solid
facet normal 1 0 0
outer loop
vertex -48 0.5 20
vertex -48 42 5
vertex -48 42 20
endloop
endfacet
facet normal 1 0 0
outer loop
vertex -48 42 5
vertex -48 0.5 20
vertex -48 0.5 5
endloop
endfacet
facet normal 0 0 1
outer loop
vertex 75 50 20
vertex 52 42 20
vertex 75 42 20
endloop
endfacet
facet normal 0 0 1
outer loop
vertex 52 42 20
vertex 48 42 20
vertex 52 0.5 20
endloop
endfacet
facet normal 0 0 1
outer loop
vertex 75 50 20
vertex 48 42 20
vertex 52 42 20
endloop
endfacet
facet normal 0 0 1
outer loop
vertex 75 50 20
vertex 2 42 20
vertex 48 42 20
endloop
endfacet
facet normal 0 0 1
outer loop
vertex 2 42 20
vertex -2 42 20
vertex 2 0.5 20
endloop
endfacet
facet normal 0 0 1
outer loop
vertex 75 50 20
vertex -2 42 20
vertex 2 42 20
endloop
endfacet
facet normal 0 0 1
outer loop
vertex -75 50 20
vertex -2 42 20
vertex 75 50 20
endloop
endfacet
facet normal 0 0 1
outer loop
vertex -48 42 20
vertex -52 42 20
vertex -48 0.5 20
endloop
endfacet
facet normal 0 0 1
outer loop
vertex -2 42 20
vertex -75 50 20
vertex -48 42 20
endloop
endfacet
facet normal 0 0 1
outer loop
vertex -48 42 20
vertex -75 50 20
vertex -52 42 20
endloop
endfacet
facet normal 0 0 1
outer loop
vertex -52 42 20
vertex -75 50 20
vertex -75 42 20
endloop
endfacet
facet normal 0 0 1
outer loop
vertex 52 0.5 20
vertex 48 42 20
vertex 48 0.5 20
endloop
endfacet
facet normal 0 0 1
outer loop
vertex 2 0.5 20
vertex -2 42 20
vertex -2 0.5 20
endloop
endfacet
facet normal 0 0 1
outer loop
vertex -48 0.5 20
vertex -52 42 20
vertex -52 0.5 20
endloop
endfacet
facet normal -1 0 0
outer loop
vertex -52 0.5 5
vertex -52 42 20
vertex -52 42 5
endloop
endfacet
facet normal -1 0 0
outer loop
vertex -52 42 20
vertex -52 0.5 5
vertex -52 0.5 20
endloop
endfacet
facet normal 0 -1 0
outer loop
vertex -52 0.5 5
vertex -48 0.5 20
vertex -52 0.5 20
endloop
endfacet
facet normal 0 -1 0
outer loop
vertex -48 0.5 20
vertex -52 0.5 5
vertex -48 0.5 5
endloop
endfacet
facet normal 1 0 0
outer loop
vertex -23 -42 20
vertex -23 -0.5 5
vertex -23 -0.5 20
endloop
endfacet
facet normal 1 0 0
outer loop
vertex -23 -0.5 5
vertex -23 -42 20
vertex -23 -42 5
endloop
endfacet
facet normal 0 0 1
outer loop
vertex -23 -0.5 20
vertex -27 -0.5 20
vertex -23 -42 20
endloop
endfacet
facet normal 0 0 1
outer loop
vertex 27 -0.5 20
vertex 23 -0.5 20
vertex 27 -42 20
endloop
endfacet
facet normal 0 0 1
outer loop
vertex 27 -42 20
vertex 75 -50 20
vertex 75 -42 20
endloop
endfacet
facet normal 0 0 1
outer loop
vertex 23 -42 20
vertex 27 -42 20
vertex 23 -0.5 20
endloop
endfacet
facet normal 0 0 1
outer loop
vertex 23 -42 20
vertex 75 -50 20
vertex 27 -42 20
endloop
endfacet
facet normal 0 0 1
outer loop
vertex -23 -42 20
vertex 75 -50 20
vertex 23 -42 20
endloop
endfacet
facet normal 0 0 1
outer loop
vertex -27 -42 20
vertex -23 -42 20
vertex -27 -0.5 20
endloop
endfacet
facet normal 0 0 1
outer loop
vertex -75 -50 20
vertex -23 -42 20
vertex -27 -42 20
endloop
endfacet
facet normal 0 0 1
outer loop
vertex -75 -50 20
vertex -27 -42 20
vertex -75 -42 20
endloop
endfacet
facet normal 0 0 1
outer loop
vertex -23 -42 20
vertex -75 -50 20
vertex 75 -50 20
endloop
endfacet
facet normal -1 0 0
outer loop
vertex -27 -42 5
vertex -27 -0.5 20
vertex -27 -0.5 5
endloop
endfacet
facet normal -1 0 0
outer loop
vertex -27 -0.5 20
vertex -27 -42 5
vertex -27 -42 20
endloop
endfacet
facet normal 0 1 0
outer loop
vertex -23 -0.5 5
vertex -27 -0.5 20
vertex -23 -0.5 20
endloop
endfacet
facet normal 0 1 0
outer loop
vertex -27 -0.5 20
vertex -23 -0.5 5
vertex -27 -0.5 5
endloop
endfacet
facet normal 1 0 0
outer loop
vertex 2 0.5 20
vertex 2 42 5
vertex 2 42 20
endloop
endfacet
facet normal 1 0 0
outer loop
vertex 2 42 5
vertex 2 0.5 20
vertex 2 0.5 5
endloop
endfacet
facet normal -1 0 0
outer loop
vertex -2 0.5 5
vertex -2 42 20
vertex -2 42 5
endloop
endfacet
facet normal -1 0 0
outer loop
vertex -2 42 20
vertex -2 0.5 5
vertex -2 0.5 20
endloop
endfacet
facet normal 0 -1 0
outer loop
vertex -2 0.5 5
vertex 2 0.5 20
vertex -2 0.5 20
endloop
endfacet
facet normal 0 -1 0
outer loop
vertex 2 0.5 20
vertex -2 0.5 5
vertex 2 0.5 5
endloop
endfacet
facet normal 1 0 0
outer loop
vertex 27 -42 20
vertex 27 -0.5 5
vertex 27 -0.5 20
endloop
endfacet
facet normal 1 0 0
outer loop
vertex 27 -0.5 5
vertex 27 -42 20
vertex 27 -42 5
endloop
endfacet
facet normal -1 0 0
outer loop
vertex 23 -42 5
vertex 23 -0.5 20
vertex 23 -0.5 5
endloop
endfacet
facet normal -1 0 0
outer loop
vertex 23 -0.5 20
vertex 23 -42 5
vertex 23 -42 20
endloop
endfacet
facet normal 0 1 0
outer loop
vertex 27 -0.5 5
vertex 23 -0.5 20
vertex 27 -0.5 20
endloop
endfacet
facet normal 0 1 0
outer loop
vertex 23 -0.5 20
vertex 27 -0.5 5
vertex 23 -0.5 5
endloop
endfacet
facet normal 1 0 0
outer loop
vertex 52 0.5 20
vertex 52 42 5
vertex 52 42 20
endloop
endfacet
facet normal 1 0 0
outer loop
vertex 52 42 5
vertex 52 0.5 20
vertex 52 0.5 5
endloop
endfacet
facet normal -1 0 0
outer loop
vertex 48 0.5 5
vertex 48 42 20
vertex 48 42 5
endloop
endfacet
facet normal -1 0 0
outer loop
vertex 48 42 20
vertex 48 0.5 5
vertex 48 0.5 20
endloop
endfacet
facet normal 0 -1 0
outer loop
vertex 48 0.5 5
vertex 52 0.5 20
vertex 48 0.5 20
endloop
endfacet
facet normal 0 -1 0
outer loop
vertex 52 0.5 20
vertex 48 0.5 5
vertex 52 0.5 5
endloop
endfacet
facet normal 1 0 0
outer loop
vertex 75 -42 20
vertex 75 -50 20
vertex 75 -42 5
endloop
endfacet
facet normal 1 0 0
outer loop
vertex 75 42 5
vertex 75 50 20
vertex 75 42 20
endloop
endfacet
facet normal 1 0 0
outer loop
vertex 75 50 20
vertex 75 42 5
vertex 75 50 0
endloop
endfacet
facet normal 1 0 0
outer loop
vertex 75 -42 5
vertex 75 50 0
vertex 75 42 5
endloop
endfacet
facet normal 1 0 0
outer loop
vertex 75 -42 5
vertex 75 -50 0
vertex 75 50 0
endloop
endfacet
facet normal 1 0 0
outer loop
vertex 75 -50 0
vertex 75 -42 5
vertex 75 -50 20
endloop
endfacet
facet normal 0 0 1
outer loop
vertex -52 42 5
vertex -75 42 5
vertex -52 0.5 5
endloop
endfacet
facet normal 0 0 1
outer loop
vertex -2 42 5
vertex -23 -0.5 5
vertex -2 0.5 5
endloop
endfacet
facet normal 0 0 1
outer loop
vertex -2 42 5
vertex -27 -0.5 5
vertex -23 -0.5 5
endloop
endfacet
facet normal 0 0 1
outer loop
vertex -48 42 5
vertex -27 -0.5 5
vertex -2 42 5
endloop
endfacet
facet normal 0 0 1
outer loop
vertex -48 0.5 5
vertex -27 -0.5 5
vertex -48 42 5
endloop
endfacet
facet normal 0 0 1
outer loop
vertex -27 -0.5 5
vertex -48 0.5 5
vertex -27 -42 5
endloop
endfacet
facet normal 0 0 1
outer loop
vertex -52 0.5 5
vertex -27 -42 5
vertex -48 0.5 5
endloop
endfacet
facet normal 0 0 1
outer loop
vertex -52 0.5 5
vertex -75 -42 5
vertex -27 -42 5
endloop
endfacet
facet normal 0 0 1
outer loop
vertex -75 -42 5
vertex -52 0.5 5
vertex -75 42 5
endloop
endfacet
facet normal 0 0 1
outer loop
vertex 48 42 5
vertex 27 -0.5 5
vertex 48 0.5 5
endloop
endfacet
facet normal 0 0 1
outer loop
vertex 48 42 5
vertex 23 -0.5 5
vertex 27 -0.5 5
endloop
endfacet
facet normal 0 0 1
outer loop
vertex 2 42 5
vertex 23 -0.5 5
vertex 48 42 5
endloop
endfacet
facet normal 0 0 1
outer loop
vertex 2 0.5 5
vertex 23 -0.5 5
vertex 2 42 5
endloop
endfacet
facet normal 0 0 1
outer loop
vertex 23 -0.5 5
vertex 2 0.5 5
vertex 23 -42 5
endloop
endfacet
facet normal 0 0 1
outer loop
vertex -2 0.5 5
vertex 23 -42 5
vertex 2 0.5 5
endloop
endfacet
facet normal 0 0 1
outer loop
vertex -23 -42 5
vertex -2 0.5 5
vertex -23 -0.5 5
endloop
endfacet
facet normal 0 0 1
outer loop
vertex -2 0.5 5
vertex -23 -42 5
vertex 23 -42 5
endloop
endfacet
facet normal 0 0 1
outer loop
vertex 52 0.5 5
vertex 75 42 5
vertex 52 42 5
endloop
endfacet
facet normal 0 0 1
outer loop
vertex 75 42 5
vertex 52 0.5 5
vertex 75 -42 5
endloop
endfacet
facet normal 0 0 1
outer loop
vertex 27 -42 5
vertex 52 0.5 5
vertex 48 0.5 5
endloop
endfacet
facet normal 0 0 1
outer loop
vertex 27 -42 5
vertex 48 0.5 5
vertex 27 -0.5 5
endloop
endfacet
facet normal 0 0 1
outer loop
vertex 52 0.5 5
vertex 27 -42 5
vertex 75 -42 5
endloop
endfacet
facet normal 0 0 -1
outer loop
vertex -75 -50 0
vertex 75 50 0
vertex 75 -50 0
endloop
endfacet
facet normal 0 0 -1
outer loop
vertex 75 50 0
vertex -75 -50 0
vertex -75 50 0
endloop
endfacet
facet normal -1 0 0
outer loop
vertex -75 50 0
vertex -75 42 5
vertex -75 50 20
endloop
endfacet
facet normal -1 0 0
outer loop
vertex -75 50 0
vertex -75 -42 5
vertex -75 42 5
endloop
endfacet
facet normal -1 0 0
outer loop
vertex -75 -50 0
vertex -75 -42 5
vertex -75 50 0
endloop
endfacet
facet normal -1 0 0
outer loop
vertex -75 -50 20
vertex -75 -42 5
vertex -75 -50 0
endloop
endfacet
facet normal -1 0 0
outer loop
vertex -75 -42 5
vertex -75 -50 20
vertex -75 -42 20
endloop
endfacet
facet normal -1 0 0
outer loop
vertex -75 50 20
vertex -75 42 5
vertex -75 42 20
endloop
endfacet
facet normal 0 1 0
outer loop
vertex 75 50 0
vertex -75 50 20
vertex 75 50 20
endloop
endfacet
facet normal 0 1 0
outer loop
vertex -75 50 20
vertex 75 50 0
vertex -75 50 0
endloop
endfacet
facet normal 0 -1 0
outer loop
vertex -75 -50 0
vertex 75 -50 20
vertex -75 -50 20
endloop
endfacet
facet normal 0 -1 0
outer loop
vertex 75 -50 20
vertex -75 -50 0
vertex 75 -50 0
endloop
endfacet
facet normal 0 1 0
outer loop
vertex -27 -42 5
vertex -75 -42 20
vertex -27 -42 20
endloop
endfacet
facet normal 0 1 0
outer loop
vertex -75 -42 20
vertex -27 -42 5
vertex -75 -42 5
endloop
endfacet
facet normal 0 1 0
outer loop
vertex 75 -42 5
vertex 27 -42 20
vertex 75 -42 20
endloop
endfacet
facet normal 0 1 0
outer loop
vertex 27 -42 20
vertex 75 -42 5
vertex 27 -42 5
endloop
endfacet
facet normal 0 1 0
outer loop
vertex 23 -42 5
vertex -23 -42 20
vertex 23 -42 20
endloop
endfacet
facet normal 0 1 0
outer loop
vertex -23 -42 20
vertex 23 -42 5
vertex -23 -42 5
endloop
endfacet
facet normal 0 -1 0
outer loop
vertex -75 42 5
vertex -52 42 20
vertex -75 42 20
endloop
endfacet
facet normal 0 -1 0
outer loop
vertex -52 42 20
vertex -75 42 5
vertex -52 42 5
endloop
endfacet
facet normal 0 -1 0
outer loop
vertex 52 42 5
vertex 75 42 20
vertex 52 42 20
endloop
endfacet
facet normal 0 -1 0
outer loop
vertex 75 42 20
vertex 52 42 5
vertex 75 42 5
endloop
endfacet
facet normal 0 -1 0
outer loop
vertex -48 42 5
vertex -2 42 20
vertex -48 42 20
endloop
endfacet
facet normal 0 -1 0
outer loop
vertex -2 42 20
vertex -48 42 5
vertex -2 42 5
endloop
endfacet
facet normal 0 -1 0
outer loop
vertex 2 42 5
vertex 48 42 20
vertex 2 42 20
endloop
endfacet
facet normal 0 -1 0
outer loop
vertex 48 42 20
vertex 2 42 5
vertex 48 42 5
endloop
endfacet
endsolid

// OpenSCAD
$fn = 32;

// ----------------------------------------------------------------------
// Rib frame 150 x 100 x 20
// 5 ribs at 25 mm pitch, staggered
// ----------------------------------------------------------------------

// --- parameters (mm) ---
frame = [150, 100, 5];  // base plate size (x, y, z)
rail_w = 8;             // side rail width
ribs = 5;               // number of ribs
rib_t = 4;              // rib thickness
rib_h = 15;             // rib height above the base plate
pitch = 25;             // pitch between rib centres

// --- derived feature positions (mm) ---
span = (ribs - 1) * pitch;          // = 100   distance between the outer ribs
origin_x = -span / 2;               // = -50   X of the first rib
rib_len = frame[1] / 2 - rail_w + 0.5;  // = 42.5   length of a staggered rib
rib_y = 0.5 + rib_len / 2;          // = 21.75   Y of a staggered rib centre
row_offset = 2 * rib_y;             // = 43.5   distance between the two rows
feature_centers = [
  [origin_x + 0 * pitch, rib_y],
  [origin_x + 1 * pitch, -rib_y],
  [origin_x + 2 * pitch, rib_y],
  [origin_x + 3 * pitch, -rib_y],
  [origin_x + 4 * pitch, rib_y]
];   // rib centre line, drives the rib loop

// base plate, two side rails, then the ribs read straight off feature_centers
union() {
  translate([-frame[0] / 2, -frame[1] / 2, 0]) cube(frame);
  translate([-frame[0] / 2, -frame[1] / 2, 0]) cube([frame[0], rail_w, frame[2] + rib_h]);
  translate([-frame[0] / 2, frame[1] / 2 - rail_w, 0]) cube([frame[0], rail_w, frame[2] + rib_h]);
  for (centre = feature_centers)
    translate([centre[0] - rib_t / 2, centre[1] - rib_len / 2, frame[2] - 1])
      cube([rib_t, rib_len, rib_h + 1]);
}
